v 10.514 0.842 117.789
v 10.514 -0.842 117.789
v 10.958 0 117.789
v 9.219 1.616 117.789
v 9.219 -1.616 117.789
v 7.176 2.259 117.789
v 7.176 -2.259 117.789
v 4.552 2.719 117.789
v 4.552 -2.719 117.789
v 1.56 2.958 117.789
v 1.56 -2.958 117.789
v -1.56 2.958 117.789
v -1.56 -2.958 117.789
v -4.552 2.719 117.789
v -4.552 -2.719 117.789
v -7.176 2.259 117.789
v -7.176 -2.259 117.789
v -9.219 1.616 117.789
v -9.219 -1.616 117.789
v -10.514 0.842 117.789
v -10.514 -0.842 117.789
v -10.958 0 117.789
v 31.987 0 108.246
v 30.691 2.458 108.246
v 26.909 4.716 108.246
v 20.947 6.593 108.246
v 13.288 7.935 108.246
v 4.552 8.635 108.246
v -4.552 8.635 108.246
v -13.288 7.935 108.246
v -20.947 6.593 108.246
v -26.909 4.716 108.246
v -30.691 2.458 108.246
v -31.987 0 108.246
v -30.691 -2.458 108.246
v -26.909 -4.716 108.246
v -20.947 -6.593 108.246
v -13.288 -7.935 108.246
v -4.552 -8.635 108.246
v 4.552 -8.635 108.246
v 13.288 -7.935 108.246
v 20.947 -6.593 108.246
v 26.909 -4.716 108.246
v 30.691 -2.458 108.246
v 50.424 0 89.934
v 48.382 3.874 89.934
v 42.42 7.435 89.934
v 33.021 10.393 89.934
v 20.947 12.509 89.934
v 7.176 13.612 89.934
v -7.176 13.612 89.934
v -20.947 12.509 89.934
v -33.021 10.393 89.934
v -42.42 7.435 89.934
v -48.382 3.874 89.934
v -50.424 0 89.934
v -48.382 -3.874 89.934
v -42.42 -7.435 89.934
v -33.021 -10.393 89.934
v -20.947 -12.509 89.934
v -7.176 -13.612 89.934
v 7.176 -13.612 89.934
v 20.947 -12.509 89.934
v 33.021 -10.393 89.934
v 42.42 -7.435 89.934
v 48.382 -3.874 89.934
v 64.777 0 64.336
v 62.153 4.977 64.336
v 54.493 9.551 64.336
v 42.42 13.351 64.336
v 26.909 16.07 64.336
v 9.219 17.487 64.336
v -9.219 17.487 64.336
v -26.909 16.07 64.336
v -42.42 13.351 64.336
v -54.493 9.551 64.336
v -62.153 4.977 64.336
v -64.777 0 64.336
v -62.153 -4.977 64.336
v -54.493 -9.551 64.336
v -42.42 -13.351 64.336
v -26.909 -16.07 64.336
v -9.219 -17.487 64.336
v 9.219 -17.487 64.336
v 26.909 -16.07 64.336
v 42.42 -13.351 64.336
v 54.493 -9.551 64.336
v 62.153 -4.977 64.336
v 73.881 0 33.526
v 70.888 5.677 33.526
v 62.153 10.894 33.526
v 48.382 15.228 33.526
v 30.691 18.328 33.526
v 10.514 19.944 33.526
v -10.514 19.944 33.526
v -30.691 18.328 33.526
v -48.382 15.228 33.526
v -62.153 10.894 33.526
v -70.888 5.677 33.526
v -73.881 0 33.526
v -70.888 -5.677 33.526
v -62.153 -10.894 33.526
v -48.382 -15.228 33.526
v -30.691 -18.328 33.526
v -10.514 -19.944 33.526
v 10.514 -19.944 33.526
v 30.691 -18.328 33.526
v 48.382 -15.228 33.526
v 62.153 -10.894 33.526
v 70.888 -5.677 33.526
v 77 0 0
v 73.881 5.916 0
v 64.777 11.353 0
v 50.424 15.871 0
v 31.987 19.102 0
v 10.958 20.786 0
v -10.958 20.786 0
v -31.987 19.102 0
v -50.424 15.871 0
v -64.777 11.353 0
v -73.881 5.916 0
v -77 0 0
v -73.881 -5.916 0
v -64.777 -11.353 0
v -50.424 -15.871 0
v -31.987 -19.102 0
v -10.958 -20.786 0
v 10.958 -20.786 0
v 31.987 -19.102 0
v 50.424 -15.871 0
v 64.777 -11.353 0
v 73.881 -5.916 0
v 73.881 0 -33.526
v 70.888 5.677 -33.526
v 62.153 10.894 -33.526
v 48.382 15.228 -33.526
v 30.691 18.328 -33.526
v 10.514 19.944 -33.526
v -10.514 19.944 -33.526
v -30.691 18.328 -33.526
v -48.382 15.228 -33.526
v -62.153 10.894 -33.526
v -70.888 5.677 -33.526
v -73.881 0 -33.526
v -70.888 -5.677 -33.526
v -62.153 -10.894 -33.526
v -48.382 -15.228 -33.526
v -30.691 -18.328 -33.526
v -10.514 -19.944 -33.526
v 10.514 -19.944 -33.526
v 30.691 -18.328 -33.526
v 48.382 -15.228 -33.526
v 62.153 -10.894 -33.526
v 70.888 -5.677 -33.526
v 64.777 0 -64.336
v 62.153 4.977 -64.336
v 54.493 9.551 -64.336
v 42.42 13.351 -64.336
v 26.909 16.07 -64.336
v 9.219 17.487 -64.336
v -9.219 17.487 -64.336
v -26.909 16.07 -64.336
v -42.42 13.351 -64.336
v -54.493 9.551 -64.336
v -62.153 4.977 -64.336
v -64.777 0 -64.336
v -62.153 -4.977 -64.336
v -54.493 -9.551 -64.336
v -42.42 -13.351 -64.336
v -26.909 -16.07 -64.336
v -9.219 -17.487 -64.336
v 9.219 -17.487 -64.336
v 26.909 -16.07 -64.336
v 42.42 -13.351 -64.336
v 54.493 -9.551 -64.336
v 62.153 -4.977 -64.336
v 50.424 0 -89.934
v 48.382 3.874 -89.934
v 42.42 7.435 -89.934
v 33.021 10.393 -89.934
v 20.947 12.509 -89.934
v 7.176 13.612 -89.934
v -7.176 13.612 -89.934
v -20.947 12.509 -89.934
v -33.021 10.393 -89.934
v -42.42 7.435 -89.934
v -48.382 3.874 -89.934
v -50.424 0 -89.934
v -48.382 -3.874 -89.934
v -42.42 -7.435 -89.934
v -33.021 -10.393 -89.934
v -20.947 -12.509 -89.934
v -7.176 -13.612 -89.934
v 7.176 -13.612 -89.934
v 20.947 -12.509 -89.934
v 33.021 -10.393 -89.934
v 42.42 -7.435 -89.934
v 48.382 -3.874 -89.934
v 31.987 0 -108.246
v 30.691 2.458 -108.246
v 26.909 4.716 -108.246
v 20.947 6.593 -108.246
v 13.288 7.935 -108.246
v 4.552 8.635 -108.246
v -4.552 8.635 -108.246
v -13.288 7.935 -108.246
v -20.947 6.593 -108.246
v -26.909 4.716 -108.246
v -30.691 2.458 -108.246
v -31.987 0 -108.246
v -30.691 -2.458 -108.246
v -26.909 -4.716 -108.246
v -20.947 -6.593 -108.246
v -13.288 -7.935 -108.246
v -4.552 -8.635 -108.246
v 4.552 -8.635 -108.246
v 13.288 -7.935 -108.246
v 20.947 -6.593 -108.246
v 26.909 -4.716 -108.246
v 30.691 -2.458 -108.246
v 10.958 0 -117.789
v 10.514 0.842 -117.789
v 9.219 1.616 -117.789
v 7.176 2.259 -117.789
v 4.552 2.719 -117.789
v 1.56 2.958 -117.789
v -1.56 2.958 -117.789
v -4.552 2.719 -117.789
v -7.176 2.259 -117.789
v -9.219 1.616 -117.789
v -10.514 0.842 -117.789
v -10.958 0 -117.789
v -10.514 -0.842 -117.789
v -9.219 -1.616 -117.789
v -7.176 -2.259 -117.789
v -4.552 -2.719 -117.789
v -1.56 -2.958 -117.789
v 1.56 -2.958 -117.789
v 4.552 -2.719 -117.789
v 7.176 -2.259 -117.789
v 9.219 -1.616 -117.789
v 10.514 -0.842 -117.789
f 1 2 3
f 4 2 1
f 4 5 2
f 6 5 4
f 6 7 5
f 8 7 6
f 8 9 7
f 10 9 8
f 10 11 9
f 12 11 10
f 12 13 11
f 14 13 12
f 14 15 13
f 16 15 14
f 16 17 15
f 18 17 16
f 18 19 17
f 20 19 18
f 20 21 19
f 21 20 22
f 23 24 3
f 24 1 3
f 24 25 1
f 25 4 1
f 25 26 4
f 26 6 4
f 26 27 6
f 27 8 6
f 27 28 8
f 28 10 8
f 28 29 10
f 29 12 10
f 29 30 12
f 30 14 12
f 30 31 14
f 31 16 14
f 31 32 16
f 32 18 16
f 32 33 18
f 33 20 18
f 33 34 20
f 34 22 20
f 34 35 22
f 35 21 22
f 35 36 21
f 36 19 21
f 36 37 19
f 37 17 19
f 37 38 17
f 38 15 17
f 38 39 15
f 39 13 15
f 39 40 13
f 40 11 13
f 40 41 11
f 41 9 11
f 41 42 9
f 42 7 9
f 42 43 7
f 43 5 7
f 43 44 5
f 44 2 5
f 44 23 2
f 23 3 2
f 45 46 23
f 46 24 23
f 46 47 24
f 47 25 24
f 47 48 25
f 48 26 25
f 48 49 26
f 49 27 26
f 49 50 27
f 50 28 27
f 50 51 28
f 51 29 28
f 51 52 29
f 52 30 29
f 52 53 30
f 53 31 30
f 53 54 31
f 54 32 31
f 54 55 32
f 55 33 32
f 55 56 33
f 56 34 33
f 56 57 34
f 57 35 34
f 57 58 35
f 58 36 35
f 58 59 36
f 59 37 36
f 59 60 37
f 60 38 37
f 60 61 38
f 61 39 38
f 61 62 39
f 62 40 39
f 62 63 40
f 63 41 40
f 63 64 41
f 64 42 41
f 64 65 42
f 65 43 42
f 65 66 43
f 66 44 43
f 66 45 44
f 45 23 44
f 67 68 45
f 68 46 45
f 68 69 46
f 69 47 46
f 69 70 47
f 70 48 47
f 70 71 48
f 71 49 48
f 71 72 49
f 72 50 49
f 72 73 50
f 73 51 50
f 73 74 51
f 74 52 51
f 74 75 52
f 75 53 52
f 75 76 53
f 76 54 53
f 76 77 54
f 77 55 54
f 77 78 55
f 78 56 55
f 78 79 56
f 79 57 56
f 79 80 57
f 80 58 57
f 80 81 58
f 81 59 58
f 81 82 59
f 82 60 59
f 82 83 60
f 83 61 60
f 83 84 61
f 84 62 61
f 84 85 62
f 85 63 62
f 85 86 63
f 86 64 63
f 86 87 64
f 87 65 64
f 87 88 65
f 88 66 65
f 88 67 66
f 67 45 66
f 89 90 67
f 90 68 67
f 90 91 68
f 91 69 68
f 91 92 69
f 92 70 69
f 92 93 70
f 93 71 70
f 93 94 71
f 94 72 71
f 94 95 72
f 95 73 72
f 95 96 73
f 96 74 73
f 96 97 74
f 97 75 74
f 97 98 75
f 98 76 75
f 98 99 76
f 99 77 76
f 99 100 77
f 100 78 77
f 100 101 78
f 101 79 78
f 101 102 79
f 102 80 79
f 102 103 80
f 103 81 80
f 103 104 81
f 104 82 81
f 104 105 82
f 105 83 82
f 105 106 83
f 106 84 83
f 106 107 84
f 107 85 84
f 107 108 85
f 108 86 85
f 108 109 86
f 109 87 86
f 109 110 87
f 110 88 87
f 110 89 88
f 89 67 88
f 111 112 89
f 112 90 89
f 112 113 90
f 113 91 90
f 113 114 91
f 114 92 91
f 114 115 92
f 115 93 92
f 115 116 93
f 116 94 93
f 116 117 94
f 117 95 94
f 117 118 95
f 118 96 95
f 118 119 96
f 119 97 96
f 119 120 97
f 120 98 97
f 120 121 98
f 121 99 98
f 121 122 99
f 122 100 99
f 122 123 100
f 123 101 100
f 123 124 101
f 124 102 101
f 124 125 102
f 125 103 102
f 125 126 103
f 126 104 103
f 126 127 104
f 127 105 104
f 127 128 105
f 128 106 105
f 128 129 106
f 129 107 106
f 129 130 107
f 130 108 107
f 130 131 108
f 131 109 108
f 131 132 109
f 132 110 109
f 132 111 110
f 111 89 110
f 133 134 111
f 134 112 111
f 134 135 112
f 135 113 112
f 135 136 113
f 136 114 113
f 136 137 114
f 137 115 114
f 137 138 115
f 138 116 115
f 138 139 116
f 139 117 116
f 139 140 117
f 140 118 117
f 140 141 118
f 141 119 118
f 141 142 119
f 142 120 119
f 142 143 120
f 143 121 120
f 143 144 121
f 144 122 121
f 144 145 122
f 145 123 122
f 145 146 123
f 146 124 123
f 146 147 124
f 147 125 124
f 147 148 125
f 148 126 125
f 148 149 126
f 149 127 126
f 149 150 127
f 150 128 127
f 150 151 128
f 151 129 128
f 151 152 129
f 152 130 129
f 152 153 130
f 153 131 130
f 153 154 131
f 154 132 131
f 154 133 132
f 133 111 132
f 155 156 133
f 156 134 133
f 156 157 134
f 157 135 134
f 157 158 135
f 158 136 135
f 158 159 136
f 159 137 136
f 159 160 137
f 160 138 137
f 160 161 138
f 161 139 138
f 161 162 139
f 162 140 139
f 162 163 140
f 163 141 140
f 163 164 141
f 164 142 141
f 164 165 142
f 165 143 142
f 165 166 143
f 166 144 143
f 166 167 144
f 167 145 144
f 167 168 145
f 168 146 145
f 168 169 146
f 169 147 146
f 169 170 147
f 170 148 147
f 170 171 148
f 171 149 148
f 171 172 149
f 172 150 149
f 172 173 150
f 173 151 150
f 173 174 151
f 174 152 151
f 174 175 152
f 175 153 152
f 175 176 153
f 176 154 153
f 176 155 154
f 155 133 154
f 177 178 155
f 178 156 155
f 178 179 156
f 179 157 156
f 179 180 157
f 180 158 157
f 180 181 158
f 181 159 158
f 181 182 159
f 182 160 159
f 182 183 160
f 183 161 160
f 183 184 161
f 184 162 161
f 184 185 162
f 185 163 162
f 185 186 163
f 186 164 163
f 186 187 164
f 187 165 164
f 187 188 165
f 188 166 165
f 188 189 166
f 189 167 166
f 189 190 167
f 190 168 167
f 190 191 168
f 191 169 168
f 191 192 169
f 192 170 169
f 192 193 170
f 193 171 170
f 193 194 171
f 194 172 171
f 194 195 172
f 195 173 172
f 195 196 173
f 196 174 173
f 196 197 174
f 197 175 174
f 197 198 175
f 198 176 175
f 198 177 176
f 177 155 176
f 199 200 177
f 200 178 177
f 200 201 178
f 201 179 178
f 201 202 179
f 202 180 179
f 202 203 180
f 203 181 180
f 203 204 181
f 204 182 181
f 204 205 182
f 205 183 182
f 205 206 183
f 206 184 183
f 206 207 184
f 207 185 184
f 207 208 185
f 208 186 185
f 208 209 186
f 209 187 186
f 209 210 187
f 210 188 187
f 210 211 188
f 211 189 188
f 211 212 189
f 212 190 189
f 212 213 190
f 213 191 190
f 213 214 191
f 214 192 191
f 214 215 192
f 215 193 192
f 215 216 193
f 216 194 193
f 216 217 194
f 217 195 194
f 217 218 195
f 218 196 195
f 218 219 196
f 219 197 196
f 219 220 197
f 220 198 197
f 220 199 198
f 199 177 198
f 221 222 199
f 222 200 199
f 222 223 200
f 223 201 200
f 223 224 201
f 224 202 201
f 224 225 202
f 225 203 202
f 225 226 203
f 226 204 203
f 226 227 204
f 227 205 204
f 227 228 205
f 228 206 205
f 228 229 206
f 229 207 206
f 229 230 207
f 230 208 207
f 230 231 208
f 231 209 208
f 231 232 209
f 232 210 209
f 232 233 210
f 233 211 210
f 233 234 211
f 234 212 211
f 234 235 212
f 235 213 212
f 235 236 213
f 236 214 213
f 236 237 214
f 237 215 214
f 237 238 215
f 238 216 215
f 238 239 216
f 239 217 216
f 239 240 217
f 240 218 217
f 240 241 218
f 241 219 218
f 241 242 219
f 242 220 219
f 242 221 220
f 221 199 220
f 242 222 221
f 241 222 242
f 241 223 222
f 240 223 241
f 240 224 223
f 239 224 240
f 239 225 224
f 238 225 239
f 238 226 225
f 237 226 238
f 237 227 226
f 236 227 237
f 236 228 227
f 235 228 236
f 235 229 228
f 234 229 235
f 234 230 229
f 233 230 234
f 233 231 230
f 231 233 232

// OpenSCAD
// Generated by SolidPython 1.0.1 on 2020-07-29 00:46:49


scale(v = [11, 3, 17]) {
	sphere(r = 7);
}
/***********************************************
*********      SolidPython code:      **********
************************************************
 
# import packages: SolidPython
from solid import *
from solid.utils import *
from itertools import chain, combinations, permutations


class Resize:

    def __init__(self, scad_file):
        self.scad_file = scad_file
        #self.scad_file = import_scad(scad_file)
        # cone/cylinder param:
        self.r1 = 0
        self.r2 = 0
        self.h = 0
        # rectangular prism param:
        self.w = 0
        self.l = 0
        # ellipse param:
        self.r = 0

    # import OpenScad code (file name corresponds to shape)


    # classify shape + parameters
    def assign(self, param1, param2, param3):
        if self.scad_file == 'cone.scad':
            self.r1 = param1
            self.r2 = param2
            self.h = param3
        elif self.scad_file == 'cylinder.scad':
            self.r1 = param1
            self.r2 = param2
            self.h = param3
        elif self.scad_file == 'rectangularPrism.scad':
            self.h = param1
            self.l = param2
            self.w = param3
        else:
            self.r = param1
            self.h = param2

    # resize parameters
    def iterate(self):
        x = range(3, 20, 2)
        i = 1
        if self.scad_file == 'cone.scad':
            tempList = list(permutations(x, 2))
            for temp in tempList:
                param1 = temp[0]
                param2 = temp[1]
                filepath = 'produced_scad_files/' + 'cone' + str(param1) + '_' + str(param2) + '_' + '.scad'
                scad_render_to_file(cylinder(h=param1, r1=param2, r2=0), filepath)

        elif self.scad_file == 'cylinder.scad':
            tempList = list(permutations(x, 3))
            for temp in tempList:
                param1 = temp[0]
                param2 = temp[1]
                filepath = 'produced_scad_files/' + 'cylinder' + str(param1) + '_' + str(param2) + '_' + '.scad'
                scad_render_to_file(cylinder(h=param1, r1=param2, r2=param2), filepath)

        elif self.scad_file == 'rectangularPrism.scad':
            tempList = list(permutations(x, 3))
            for temp in tempList:
                param1 = temp[0]
                param2 = temp[1]
                param3 = temp[2]
                filepath = 'produced_scad_files/' + 'rectangularPrism' + str(param1) + '_' + str(param2) + '_' + str(
                    param3) + '.scad'
                scad_render_to_file(cube(size=(param1, param2, param3)), filepath)

        elif self.scad_file == 'ellipse.scad':
            tempList = list(permutations(x, 4))
            for temp in tempList:
                param1 = temp[0]
                param2 = temp[1]
                param3 = temp[2]
                param4 = temp[3]
                filepath = 'produced_scad_files/' + 'ellipse' + str(param1) + '_' + str(param2) + '_' + str(param3) + '_' + str(param4) + '.scad'
                scad_render_to_file(scale([param1, param2, param3])(sphere(r=param4)), filepath)

    def render_to_scadfile(self):
        scad_render_to_file(scad, 'example.scad') 
 
************************************************/
